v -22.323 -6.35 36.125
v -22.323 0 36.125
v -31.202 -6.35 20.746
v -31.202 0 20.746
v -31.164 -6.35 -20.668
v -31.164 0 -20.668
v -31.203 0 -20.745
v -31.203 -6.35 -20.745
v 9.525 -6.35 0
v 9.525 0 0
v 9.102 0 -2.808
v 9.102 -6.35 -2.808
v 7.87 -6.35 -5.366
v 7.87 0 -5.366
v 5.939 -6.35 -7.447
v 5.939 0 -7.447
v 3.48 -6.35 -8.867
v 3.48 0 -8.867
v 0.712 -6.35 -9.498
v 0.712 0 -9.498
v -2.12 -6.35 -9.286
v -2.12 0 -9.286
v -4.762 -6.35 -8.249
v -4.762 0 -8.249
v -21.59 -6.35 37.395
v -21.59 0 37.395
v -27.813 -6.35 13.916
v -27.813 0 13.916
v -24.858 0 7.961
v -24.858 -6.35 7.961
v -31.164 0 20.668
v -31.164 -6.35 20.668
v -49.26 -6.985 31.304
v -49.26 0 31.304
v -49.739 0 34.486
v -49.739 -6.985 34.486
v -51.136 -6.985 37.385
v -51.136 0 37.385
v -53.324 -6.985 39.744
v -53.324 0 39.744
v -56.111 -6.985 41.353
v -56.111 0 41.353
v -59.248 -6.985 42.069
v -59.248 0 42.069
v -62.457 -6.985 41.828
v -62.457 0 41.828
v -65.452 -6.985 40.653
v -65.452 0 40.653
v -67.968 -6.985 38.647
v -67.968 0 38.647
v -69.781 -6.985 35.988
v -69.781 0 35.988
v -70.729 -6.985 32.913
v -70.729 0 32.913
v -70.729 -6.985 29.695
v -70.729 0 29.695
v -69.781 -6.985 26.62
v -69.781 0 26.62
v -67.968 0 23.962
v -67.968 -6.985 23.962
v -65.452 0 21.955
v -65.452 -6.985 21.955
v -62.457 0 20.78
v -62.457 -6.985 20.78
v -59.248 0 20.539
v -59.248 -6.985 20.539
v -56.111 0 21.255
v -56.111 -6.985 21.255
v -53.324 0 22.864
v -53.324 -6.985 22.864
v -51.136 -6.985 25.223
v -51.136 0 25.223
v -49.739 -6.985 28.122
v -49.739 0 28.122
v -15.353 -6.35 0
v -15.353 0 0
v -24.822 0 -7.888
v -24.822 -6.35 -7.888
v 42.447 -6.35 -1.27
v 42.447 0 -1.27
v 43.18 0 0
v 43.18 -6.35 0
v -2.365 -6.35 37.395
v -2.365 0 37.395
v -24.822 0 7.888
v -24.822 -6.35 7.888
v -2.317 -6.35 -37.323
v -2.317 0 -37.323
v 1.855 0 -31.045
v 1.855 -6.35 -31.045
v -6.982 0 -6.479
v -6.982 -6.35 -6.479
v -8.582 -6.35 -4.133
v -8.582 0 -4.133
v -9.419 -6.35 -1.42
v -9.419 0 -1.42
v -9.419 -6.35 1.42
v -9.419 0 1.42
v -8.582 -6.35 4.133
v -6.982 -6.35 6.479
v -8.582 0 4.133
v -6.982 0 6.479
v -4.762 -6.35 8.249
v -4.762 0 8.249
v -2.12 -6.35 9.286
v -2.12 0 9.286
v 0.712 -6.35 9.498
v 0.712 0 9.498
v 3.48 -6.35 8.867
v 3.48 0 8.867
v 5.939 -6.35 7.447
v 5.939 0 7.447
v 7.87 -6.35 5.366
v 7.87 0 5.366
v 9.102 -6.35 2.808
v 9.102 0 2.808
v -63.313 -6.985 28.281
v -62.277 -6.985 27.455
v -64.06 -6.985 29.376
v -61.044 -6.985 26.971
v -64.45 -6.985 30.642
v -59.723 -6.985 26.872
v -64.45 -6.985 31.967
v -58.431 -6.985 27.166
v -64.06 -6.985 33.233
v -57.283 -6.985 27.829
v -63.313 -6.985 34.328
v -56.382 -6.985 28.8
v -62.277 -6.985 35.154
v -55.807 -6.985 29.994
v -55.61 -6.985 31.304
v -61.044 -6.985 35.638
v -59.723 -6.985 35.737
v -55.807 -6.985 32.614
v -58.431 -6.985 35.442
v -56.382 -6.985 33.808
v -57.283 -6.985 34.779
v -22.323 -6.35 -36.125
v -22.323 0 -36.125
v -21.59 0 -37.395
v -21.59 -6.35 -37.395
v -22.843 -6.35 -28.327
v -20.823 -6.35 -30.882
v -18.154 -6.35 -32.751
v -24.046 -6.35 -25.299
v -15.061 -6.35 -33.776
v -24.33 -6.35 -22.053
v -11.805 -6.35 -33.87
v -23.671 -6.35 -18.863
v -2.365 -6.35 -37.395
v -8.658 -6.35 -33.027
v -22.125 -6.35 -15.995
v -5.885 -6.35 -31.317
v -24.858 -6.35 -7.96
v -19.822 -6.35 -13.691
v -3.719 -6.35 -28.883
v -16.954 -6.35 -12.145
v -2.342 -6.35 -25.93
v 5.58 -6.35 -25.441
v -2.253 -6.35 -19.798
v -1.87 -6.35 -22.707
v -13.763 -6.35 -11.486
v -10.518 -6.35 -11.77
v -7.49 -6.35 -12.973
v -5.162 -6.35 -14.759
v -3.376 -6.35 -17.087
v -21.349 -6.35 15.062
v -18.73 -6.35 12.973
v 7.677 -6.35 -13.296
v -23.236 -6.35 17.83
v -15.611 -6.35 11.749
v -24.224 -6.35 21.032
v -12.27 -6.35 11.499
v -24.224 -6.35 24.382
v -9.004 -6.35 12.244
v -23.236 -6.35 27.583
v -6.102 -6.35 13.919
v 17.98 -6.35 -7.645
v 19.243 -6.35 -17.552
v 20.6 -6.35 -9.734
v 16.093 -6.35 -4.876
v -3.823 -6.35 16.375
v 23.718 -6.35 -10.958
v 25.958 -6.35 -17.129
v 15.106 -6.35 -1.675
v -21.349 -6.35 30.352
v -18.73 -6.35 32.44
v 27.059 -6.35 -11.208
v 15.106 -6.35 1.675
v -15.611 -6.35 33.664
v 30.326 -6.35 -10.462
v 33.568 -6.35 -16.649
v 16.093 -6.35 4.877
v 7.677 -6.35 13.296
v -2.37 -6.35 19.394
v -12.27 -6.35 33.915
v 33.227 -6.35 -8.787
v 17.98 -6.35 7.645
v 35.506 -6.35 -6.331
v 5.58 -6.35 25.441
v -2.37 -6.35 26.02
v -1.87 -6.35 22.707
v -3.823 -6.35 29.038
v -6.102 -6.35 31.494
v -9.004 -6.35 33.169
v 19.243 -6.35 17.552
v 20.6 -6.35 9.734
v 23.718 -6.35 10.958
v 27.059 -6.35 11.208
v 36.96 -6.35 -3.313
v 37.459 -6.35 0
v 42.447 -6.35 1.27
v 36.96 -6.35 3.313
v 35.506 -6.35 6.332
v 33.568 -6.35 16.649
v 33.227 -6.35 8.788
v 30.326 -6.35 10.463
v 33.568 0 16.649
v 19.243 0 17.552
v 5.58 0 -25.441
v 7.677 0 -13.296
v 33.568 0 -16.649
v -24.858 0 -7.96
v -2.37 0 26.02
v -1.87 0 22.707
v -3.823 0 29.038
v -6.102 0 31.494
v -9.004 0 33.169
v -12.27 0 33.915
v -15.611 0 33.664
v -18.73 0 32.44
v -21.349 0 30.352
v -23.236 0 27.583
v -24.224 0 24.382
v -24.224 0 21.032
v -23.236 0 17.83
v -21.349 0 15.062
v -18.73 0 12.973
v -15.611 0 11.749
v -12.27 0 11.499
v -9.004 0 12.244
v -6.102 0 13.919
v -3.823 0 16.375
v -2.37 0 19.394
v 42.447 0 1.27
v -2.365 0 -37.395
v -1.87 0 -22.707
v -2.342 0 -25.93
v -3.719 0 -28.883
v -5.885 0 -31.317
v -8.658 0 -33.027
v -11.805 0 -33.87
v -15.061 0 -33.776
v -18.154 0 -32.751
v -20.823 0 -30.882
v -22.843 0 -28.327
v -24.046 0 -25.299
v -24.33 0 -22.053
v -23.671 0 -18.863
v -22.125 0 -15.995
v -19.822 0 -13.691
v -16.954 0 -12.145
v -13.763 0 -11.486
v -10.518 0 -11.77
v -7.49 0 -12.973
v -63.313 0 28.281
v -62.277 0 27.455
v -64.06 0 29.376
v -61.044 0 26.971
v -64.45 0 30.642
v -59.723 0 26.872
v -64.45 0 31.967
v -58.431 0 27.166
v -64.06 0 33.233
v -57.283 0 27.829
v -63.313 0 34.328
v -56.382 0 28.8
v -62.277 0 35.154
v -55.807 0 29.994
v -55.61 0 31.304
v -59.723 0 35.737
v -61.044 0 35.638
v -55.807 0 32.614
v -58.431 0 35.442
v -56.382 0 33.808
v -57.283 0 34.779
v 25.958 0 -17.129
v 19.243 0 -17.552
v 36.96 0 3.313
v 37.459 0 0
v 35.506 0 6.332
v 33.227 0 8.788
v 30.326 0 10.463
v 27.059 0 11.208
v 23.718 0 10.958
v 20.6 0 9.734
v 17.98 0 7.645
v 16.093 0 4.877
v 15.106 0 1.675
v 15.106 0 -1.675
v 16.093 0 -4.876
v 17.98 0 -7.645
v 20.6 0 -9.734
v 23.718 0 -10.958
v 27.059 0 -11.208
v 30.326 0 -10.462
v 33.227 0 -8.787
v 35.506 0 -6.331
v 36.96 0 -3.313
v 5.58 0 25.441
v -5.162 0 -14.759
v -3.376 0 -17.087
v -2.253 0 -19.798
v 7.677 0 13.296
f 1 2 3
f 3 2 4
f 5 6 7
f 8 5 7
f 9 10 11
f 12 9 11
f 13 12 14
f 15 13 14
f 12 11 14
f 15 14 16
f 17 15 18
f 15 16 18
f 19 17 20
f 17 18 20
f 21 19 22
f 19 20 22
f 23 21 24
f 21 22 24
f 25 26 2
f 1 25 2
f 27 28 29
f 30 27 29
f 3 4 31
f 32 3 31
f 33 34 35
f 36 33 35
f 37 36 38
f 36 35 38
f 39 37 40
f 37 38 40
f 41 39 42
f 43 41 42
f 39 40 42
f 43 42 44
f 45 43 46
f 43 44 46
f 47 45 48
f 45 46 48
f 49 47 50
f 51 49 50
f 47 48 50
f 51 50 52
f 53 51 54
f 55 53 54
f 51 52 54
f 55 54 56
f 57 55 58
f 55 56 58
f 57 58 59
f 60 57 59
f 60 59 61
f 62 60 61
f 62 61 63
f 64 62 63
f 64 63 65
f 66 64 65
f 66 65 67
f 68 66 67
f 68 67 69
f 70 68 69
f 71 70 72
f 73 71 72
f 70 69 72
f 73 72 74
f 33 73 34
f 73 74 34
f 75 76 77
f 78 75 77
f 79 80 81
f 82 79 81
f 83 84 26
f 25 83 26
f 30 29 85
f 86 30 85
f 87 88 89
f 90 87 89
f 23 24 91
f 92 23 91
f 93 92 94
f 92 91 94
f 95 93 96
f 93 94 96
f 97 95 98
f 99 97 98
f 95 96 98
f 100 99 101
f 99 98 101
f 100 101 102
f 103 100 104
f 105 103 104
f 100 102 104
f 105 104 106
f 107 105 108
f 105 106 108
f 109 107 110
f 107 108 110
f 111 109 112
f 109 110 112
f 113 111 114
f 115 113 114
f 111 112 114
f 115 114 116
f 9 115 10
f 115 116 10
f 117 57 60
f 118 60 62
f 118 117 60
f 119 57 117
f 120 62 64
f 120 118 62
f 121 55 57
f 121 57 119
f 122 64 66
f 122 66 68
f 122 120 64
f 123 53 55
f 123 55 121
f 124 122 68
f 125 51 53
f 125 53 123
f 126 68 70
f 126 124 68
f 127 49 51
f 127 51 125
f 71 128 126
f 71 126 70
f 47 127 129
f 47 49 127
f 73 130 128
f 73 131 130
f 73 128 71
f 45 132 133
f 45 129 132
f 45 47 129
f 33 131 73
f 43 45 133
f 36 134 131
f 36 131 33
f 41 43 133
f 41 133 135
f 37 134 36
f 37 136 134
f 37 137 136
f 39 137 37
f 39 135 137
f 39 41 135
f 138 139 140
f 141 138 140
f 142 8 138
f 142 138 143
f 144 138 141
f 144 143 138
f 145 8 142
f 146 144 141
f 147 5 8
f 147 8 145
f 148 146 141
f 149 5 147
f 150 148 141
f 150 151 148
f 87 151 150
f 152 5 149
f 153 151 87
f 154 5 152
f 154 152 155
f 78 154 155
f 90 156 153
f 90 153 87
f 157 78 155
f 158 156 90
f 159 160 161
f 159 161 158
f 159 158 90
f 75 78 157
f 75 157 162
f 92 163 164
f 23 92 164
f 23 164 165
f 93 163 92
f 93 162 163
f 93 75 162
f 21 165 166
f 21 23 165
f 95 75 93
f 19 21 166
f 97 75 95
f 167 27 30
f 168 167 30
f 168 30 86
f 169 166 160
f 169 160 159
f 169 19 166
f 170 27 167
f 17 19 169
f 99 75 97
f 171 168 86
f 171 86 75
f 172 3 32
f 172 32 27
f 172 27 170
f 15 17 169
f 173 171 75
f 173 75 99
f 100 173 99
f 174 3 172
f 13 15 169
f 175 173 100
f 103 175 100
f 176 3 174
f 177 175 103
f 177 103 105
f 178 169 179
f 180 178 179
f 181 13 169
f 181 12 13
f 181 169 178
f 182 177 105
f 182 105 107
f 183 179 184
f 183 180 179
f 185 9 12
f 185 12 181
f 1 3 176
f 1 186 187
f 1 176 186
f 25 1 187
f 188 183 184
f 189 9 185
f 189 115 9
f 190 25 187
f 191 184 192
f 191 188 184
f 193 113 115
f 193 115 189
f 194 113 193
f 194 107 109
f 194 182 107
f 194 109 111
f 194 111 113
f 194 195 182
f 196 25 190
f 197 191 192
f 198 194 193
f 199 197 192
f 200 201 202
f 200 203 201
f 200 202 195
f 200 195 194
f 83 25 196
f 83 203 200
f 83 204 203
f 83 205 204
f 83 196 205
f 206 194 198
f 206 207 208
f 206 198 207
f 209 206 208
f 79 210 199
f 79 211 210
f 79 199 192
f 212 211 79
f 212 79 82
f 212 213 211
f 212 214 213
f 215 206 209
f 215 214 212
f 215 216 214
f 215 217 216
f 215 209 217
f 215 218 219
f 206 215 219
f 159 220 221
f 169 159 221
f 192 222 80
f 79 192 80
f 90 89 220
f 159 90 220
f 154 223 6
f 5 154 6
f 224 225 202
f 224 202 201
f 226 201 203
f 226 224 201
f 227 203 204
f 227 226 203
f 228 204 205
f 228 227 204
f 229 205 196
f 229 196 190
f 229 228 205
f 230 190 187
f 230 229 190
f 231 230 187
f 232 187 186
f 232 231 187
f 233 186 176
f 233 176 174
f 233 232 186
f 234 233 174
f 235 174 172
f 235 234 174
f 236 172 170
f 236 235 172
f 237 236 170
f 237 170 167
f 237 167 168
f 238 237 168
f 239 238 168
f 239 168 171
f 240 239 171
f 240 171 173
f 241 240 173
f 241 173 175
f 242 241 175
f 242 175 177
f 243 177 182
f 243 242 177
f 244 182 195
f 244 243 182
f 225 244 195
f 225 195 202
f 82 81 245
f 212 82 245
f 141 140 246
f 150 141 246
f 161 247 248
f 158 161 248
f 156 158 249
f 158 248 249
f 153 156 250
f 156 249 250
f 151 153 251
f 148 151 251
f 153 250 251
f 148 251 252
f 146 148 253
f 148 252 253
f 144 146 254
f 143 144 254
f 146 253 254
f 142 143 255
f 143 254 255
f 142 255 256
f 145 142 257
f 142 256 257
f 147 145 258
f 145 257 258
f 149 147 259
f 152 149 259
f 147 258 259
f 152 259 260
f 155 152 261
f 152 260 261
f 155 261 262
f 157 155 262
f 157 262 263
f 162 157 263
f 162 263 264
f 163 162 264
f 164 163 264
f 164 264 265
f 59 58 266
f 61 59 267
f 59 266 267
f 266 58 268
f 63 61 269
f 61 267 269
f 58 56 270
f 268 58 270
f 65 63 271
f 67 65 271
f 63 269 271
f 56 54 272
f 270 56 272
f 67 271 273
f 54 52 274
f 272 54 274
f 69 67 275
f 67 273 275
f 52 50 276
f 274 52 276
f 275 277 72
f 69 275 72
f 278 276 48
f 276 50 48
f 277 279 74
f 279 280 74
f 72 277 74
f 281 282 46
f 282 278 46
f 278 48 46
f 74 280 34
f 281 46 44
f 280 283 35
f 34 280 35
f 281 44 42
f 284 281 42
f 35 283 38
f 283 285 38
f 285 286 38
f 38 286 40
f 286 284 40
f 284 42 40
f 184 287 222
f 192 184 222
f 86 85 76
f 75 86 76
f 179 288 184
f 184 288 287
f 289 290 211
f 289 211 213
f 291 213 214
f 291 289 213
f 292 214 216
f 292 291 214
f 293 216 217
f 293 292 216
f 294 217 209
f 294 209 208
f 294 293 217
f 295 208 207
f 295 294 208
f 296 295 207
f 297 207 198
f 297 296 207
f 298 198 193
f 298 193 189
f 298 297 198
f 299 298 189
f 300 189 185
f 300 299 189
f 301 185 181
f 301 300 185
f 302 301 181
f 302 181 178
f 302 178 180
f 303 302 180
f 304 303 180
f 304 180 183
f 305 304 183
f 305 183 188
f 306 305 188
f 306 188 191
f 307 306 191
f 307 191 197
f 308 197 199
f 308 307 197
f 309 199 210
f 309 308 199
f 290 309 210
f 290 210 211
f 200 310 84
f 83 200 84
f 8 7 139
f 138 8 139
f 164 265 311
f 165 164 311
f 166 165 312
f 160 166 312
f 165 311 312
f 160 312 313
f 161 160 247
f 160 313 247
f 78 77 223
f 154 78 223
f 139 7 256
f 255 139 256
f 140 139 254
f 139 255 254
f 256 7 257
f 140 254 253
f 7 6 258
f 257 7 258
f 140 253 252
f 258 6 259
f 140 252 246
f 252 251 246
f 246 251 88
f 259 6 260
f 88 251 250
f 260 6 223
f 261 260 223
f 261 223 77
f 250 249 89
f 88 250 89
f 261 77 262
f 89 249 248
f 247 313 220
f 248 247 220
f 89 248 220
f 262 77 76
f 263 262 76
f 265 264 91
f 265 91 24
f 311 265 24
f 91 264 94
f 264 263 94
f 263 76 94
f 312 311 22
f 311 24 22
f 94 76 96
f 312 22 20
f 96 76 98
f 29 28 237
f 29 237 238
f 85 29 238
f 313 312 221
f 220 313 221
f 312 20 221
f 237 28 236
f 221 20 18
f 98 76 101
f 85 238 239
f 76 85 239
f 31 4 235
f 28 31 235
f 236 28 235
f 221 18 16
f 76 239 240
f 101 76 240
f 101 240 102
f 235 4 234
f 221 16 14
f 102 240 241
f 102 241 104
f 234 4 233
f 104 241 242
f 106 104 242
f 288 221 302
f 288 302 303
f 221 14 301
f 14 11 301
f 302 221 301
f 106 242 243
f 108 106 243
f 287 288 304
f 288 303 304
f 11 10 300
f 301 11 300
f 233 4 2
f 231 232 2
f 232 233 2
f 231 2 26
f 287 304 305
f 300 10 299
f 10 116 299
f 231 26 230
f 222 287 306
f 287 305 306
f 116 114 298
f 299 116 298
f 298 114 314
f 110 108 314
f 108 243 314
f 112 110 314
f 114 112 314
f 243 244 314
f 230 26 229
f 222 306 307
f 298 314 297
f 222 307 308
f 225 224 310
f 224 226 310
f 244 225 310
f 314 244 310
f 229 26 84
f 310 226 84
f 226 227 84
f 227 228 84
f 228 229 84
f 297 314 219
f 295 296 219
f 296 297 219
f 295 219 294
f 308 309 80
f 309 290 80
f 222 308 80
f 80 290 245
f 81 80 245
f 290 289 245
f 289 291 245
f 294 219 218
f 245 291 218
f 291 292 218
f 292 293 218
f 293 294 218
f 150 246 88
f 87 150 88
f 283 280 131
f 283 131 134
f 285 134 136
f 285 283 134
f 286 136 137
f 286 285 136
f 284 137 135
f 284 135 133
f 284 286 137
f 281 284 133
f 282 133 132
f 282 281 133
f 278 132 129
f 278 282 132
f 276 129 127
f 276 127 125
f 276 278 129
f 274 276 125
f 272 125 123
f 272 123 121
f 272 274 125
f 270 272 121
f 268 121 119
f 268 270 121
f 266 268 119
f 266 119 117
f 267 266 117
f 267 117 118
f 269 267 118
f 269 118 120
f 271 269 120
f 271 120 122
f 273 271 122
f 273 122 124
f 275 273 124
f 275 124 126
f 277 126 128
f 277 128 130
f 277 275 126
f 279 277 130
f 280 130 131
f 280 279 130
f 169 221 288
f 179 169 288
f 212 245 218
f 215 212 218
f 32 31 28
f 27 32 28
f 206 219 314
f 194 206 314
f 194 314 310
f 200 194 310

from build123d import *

# Parameters (mm, degrees)
F0_R     = 11.2395
F1_DEPTH = 6.35
F2_R     = 10.795
F2_R_2   = 4.445
F3_DEPTH = 6.985


# Not quite as in the source:
# - ends of sketch curves that miss each other by under 0.0002 mm in the source are joined


with BuildPart() as f1:
    # F0 (on Front) → F1 (new body)
    with BuildSketch(Plane.XZ):
        with BuildLine():
            Line((42.4467651581, 1.27), (33.5675281941, 16.6492895541))
            Line((33.5675281941, 16.6492895541), (19.2425445444, 17.5521669359))
            Line((19.2425445444, 17.5521669359), (7.6766035347, 13.2964561731))
            Line((7.6766035347, 13.2964561731), (5.579663063, 25.4405181745))
            Line((5.579663063, 25.4405181745), (-2.3645964913, 37.3949769354))
            Line((-2.3645964913, 37.3949769354), (-20.1235303163, 37.3949769354))
            ThreePointArc((-20.1235303163, 37.3949769354), (-21.3935303163, 37.054681461), (-22.3232348419, 36.1249769354))
            Line((-22.3232348419, 36.1249769354), (-31.2024718059, 20.7456873813))
            Line((-31.2024718059, 20.7456873813), (-31.1641125036, 20.668391129))
            Line((-31.1641125036, 20.668391129), (-27.8130050023, 13.9157122299))
            Line((-27.8130050023, 13.9157122299), (-24.8577417731, 7.960682843))
            Line((-24.8577417731, 7.960682843), (-24.8218947301, 7.8884489409))
            Line((-24.8218947301, 7.8884489409), (-15.353319828, -3.34766e-05))
            Line((-15.353319828, -3.34766e-05), (-24.8219665561, -7.8881291301))
            Line((-24.8219665561, -7.8881291301), (-24.8578663434, -7.9604670809))
            Line((-24.8578663434, -7.9604670809), (-31.1643564099, -20.6680233587))
            Line((-31.1643564099, -20.6680233587), (-31.2027017544, -20.7452890988))
            Line((-31.2027017544, -20.7452890988), (-22.3232348418, -36.1249769356))
            ThreePointArc((-22.3232348418, -36.1249769356), (-21.9195815404, -36.6510281597), (-21.3935303163, -37.0546814611))
            ThreePointArc((-21.3935303163, -37.0546814611), (-20.7809306909, -37.3084285342), (-20.1235303165, -37.3949769354))
            Line((-20.1235303165, -37.3949769354), (-2.3645964913, -37.3949769354))
            Line((-2.3645964913, -37.3949769354), (-2.3168550697, -37.3231360229))
            Line((-2.3168550697, -37.3231360229), (1.8552556307, -31.0449769354))
            Line((1.8552556307, -31.0449769354), (5.579663063, -25.4405181745))
            Line((5.579663063, -25.4405181745), (7.6765207659, -13.2964418818))
            Line((7.6765207659, -13.2964418818), (19.2425445444, -17.5521669359))
            Line((19.2425445444, -17.5521669359), (25.957862804, -17.1289127727))
            Line((25.957862804, -17.1289127727), (33.5675281941, -16.6492895541))
            Line((33.5675281941, -16.6492895541), (42.4467651581, -1.27))
            ThreePointArc((42.4467651581, -1.27), (42.7870606325, 0), (42.4467651581, 1.27))
        make_face()
        with BuildLine():
            ThreePointArc((-1.8702560234, -22.7067635073), (-22.8434485492, -28.3265135073), (-7.4900060234, -12.9730709815))
            ThreePointArc((-7.4900060234, -12.9730709815), (-3.3760634975, -17.0870135073), (-1.8702560234, -22.7067635073))
        make_face(mode=Mode.SUBTRACT)
        with BuildLine():
            ThreePointArc((-4.7625, -8.248891971), (-4.7625, 8.248891971), (9.525, 0))
            ThreePointArc((9.525, 0), (4.7625, -8.248891971), (-4.7625, -8.248891971))
        make_face(mode=Mode.SUBTRACT)
        with Locations((-13.1097560234, 22.7067635073)):
            Circle(F0_R, mode=Mode.SUBTRACT)
        with Locations((26.2195120463, 0.0001612286)):
            Circle(F0_R, mode=Mode.SUBTRACT)
        with BuildLine():
            Line((43.18, 0), (42.4467651581, 1.27))
            ThreePointArc((42.4467651581, 1.27), (42.7870606325, 0), (42.4467651581, -1.27))
            Line((42.4467651581, -1.27), (43.18, 0))
        make_face()
        with BuildLine():
            ThreePointArc((-22.3232348419, 36.1249769354), (-21.3935303163, 37.054681461), (-20.1235303163, 37.3949769354))
            Line((-20.1235303163, 37.3949769354), (-21.59, 37.3949769354))
            Line((-21.59, 37.3949769354), (-22.3232348419, 36.1249769354))
        make_face()
        with BuildLine():
            Line((-21.59, -37.3949769354), (-20.1235303165, -37.3949769354))
            ThreePointArc((-20.1235303165, -37.3949769354), (-20.7809306909, -37.3084285342), (-21.3935303163, -37.0546814611))
            Line((-21.3935303163, -37.0546814611), (-21.59, -37.3949769354))
        make_face()
        with BuildLine():
            Line((-21.59, -37.3949769354), (-21.3935303163, -37.0546814611))
            ThreePointArc((-21.3935303163, -37.0546814611), (-21.9195815404, -36.6510281597), (-22.3232348418, -36.1249769356))
            Line((-22.3232348418, -36.1249769356), (-21.59, -37.3949769354))
        make_face()
    extrude(amount=F1_DEPTH)


with BuildPart() as f3:
    # F2 (on Front) → F3 (new body)
    with BuildSketch(Plane.XZ):
        with Locations((-60.0547902286, 31.3041508198)):
            Circle(F2_R)
        with Locations((-60.0547902286, 31.3041508198)):
            Circle(F2_R_2, mode=Mode.SUBTRACT)
    extrude(amount=F3_DEPTH)


solid = Compound([f1.part, f3.part])
